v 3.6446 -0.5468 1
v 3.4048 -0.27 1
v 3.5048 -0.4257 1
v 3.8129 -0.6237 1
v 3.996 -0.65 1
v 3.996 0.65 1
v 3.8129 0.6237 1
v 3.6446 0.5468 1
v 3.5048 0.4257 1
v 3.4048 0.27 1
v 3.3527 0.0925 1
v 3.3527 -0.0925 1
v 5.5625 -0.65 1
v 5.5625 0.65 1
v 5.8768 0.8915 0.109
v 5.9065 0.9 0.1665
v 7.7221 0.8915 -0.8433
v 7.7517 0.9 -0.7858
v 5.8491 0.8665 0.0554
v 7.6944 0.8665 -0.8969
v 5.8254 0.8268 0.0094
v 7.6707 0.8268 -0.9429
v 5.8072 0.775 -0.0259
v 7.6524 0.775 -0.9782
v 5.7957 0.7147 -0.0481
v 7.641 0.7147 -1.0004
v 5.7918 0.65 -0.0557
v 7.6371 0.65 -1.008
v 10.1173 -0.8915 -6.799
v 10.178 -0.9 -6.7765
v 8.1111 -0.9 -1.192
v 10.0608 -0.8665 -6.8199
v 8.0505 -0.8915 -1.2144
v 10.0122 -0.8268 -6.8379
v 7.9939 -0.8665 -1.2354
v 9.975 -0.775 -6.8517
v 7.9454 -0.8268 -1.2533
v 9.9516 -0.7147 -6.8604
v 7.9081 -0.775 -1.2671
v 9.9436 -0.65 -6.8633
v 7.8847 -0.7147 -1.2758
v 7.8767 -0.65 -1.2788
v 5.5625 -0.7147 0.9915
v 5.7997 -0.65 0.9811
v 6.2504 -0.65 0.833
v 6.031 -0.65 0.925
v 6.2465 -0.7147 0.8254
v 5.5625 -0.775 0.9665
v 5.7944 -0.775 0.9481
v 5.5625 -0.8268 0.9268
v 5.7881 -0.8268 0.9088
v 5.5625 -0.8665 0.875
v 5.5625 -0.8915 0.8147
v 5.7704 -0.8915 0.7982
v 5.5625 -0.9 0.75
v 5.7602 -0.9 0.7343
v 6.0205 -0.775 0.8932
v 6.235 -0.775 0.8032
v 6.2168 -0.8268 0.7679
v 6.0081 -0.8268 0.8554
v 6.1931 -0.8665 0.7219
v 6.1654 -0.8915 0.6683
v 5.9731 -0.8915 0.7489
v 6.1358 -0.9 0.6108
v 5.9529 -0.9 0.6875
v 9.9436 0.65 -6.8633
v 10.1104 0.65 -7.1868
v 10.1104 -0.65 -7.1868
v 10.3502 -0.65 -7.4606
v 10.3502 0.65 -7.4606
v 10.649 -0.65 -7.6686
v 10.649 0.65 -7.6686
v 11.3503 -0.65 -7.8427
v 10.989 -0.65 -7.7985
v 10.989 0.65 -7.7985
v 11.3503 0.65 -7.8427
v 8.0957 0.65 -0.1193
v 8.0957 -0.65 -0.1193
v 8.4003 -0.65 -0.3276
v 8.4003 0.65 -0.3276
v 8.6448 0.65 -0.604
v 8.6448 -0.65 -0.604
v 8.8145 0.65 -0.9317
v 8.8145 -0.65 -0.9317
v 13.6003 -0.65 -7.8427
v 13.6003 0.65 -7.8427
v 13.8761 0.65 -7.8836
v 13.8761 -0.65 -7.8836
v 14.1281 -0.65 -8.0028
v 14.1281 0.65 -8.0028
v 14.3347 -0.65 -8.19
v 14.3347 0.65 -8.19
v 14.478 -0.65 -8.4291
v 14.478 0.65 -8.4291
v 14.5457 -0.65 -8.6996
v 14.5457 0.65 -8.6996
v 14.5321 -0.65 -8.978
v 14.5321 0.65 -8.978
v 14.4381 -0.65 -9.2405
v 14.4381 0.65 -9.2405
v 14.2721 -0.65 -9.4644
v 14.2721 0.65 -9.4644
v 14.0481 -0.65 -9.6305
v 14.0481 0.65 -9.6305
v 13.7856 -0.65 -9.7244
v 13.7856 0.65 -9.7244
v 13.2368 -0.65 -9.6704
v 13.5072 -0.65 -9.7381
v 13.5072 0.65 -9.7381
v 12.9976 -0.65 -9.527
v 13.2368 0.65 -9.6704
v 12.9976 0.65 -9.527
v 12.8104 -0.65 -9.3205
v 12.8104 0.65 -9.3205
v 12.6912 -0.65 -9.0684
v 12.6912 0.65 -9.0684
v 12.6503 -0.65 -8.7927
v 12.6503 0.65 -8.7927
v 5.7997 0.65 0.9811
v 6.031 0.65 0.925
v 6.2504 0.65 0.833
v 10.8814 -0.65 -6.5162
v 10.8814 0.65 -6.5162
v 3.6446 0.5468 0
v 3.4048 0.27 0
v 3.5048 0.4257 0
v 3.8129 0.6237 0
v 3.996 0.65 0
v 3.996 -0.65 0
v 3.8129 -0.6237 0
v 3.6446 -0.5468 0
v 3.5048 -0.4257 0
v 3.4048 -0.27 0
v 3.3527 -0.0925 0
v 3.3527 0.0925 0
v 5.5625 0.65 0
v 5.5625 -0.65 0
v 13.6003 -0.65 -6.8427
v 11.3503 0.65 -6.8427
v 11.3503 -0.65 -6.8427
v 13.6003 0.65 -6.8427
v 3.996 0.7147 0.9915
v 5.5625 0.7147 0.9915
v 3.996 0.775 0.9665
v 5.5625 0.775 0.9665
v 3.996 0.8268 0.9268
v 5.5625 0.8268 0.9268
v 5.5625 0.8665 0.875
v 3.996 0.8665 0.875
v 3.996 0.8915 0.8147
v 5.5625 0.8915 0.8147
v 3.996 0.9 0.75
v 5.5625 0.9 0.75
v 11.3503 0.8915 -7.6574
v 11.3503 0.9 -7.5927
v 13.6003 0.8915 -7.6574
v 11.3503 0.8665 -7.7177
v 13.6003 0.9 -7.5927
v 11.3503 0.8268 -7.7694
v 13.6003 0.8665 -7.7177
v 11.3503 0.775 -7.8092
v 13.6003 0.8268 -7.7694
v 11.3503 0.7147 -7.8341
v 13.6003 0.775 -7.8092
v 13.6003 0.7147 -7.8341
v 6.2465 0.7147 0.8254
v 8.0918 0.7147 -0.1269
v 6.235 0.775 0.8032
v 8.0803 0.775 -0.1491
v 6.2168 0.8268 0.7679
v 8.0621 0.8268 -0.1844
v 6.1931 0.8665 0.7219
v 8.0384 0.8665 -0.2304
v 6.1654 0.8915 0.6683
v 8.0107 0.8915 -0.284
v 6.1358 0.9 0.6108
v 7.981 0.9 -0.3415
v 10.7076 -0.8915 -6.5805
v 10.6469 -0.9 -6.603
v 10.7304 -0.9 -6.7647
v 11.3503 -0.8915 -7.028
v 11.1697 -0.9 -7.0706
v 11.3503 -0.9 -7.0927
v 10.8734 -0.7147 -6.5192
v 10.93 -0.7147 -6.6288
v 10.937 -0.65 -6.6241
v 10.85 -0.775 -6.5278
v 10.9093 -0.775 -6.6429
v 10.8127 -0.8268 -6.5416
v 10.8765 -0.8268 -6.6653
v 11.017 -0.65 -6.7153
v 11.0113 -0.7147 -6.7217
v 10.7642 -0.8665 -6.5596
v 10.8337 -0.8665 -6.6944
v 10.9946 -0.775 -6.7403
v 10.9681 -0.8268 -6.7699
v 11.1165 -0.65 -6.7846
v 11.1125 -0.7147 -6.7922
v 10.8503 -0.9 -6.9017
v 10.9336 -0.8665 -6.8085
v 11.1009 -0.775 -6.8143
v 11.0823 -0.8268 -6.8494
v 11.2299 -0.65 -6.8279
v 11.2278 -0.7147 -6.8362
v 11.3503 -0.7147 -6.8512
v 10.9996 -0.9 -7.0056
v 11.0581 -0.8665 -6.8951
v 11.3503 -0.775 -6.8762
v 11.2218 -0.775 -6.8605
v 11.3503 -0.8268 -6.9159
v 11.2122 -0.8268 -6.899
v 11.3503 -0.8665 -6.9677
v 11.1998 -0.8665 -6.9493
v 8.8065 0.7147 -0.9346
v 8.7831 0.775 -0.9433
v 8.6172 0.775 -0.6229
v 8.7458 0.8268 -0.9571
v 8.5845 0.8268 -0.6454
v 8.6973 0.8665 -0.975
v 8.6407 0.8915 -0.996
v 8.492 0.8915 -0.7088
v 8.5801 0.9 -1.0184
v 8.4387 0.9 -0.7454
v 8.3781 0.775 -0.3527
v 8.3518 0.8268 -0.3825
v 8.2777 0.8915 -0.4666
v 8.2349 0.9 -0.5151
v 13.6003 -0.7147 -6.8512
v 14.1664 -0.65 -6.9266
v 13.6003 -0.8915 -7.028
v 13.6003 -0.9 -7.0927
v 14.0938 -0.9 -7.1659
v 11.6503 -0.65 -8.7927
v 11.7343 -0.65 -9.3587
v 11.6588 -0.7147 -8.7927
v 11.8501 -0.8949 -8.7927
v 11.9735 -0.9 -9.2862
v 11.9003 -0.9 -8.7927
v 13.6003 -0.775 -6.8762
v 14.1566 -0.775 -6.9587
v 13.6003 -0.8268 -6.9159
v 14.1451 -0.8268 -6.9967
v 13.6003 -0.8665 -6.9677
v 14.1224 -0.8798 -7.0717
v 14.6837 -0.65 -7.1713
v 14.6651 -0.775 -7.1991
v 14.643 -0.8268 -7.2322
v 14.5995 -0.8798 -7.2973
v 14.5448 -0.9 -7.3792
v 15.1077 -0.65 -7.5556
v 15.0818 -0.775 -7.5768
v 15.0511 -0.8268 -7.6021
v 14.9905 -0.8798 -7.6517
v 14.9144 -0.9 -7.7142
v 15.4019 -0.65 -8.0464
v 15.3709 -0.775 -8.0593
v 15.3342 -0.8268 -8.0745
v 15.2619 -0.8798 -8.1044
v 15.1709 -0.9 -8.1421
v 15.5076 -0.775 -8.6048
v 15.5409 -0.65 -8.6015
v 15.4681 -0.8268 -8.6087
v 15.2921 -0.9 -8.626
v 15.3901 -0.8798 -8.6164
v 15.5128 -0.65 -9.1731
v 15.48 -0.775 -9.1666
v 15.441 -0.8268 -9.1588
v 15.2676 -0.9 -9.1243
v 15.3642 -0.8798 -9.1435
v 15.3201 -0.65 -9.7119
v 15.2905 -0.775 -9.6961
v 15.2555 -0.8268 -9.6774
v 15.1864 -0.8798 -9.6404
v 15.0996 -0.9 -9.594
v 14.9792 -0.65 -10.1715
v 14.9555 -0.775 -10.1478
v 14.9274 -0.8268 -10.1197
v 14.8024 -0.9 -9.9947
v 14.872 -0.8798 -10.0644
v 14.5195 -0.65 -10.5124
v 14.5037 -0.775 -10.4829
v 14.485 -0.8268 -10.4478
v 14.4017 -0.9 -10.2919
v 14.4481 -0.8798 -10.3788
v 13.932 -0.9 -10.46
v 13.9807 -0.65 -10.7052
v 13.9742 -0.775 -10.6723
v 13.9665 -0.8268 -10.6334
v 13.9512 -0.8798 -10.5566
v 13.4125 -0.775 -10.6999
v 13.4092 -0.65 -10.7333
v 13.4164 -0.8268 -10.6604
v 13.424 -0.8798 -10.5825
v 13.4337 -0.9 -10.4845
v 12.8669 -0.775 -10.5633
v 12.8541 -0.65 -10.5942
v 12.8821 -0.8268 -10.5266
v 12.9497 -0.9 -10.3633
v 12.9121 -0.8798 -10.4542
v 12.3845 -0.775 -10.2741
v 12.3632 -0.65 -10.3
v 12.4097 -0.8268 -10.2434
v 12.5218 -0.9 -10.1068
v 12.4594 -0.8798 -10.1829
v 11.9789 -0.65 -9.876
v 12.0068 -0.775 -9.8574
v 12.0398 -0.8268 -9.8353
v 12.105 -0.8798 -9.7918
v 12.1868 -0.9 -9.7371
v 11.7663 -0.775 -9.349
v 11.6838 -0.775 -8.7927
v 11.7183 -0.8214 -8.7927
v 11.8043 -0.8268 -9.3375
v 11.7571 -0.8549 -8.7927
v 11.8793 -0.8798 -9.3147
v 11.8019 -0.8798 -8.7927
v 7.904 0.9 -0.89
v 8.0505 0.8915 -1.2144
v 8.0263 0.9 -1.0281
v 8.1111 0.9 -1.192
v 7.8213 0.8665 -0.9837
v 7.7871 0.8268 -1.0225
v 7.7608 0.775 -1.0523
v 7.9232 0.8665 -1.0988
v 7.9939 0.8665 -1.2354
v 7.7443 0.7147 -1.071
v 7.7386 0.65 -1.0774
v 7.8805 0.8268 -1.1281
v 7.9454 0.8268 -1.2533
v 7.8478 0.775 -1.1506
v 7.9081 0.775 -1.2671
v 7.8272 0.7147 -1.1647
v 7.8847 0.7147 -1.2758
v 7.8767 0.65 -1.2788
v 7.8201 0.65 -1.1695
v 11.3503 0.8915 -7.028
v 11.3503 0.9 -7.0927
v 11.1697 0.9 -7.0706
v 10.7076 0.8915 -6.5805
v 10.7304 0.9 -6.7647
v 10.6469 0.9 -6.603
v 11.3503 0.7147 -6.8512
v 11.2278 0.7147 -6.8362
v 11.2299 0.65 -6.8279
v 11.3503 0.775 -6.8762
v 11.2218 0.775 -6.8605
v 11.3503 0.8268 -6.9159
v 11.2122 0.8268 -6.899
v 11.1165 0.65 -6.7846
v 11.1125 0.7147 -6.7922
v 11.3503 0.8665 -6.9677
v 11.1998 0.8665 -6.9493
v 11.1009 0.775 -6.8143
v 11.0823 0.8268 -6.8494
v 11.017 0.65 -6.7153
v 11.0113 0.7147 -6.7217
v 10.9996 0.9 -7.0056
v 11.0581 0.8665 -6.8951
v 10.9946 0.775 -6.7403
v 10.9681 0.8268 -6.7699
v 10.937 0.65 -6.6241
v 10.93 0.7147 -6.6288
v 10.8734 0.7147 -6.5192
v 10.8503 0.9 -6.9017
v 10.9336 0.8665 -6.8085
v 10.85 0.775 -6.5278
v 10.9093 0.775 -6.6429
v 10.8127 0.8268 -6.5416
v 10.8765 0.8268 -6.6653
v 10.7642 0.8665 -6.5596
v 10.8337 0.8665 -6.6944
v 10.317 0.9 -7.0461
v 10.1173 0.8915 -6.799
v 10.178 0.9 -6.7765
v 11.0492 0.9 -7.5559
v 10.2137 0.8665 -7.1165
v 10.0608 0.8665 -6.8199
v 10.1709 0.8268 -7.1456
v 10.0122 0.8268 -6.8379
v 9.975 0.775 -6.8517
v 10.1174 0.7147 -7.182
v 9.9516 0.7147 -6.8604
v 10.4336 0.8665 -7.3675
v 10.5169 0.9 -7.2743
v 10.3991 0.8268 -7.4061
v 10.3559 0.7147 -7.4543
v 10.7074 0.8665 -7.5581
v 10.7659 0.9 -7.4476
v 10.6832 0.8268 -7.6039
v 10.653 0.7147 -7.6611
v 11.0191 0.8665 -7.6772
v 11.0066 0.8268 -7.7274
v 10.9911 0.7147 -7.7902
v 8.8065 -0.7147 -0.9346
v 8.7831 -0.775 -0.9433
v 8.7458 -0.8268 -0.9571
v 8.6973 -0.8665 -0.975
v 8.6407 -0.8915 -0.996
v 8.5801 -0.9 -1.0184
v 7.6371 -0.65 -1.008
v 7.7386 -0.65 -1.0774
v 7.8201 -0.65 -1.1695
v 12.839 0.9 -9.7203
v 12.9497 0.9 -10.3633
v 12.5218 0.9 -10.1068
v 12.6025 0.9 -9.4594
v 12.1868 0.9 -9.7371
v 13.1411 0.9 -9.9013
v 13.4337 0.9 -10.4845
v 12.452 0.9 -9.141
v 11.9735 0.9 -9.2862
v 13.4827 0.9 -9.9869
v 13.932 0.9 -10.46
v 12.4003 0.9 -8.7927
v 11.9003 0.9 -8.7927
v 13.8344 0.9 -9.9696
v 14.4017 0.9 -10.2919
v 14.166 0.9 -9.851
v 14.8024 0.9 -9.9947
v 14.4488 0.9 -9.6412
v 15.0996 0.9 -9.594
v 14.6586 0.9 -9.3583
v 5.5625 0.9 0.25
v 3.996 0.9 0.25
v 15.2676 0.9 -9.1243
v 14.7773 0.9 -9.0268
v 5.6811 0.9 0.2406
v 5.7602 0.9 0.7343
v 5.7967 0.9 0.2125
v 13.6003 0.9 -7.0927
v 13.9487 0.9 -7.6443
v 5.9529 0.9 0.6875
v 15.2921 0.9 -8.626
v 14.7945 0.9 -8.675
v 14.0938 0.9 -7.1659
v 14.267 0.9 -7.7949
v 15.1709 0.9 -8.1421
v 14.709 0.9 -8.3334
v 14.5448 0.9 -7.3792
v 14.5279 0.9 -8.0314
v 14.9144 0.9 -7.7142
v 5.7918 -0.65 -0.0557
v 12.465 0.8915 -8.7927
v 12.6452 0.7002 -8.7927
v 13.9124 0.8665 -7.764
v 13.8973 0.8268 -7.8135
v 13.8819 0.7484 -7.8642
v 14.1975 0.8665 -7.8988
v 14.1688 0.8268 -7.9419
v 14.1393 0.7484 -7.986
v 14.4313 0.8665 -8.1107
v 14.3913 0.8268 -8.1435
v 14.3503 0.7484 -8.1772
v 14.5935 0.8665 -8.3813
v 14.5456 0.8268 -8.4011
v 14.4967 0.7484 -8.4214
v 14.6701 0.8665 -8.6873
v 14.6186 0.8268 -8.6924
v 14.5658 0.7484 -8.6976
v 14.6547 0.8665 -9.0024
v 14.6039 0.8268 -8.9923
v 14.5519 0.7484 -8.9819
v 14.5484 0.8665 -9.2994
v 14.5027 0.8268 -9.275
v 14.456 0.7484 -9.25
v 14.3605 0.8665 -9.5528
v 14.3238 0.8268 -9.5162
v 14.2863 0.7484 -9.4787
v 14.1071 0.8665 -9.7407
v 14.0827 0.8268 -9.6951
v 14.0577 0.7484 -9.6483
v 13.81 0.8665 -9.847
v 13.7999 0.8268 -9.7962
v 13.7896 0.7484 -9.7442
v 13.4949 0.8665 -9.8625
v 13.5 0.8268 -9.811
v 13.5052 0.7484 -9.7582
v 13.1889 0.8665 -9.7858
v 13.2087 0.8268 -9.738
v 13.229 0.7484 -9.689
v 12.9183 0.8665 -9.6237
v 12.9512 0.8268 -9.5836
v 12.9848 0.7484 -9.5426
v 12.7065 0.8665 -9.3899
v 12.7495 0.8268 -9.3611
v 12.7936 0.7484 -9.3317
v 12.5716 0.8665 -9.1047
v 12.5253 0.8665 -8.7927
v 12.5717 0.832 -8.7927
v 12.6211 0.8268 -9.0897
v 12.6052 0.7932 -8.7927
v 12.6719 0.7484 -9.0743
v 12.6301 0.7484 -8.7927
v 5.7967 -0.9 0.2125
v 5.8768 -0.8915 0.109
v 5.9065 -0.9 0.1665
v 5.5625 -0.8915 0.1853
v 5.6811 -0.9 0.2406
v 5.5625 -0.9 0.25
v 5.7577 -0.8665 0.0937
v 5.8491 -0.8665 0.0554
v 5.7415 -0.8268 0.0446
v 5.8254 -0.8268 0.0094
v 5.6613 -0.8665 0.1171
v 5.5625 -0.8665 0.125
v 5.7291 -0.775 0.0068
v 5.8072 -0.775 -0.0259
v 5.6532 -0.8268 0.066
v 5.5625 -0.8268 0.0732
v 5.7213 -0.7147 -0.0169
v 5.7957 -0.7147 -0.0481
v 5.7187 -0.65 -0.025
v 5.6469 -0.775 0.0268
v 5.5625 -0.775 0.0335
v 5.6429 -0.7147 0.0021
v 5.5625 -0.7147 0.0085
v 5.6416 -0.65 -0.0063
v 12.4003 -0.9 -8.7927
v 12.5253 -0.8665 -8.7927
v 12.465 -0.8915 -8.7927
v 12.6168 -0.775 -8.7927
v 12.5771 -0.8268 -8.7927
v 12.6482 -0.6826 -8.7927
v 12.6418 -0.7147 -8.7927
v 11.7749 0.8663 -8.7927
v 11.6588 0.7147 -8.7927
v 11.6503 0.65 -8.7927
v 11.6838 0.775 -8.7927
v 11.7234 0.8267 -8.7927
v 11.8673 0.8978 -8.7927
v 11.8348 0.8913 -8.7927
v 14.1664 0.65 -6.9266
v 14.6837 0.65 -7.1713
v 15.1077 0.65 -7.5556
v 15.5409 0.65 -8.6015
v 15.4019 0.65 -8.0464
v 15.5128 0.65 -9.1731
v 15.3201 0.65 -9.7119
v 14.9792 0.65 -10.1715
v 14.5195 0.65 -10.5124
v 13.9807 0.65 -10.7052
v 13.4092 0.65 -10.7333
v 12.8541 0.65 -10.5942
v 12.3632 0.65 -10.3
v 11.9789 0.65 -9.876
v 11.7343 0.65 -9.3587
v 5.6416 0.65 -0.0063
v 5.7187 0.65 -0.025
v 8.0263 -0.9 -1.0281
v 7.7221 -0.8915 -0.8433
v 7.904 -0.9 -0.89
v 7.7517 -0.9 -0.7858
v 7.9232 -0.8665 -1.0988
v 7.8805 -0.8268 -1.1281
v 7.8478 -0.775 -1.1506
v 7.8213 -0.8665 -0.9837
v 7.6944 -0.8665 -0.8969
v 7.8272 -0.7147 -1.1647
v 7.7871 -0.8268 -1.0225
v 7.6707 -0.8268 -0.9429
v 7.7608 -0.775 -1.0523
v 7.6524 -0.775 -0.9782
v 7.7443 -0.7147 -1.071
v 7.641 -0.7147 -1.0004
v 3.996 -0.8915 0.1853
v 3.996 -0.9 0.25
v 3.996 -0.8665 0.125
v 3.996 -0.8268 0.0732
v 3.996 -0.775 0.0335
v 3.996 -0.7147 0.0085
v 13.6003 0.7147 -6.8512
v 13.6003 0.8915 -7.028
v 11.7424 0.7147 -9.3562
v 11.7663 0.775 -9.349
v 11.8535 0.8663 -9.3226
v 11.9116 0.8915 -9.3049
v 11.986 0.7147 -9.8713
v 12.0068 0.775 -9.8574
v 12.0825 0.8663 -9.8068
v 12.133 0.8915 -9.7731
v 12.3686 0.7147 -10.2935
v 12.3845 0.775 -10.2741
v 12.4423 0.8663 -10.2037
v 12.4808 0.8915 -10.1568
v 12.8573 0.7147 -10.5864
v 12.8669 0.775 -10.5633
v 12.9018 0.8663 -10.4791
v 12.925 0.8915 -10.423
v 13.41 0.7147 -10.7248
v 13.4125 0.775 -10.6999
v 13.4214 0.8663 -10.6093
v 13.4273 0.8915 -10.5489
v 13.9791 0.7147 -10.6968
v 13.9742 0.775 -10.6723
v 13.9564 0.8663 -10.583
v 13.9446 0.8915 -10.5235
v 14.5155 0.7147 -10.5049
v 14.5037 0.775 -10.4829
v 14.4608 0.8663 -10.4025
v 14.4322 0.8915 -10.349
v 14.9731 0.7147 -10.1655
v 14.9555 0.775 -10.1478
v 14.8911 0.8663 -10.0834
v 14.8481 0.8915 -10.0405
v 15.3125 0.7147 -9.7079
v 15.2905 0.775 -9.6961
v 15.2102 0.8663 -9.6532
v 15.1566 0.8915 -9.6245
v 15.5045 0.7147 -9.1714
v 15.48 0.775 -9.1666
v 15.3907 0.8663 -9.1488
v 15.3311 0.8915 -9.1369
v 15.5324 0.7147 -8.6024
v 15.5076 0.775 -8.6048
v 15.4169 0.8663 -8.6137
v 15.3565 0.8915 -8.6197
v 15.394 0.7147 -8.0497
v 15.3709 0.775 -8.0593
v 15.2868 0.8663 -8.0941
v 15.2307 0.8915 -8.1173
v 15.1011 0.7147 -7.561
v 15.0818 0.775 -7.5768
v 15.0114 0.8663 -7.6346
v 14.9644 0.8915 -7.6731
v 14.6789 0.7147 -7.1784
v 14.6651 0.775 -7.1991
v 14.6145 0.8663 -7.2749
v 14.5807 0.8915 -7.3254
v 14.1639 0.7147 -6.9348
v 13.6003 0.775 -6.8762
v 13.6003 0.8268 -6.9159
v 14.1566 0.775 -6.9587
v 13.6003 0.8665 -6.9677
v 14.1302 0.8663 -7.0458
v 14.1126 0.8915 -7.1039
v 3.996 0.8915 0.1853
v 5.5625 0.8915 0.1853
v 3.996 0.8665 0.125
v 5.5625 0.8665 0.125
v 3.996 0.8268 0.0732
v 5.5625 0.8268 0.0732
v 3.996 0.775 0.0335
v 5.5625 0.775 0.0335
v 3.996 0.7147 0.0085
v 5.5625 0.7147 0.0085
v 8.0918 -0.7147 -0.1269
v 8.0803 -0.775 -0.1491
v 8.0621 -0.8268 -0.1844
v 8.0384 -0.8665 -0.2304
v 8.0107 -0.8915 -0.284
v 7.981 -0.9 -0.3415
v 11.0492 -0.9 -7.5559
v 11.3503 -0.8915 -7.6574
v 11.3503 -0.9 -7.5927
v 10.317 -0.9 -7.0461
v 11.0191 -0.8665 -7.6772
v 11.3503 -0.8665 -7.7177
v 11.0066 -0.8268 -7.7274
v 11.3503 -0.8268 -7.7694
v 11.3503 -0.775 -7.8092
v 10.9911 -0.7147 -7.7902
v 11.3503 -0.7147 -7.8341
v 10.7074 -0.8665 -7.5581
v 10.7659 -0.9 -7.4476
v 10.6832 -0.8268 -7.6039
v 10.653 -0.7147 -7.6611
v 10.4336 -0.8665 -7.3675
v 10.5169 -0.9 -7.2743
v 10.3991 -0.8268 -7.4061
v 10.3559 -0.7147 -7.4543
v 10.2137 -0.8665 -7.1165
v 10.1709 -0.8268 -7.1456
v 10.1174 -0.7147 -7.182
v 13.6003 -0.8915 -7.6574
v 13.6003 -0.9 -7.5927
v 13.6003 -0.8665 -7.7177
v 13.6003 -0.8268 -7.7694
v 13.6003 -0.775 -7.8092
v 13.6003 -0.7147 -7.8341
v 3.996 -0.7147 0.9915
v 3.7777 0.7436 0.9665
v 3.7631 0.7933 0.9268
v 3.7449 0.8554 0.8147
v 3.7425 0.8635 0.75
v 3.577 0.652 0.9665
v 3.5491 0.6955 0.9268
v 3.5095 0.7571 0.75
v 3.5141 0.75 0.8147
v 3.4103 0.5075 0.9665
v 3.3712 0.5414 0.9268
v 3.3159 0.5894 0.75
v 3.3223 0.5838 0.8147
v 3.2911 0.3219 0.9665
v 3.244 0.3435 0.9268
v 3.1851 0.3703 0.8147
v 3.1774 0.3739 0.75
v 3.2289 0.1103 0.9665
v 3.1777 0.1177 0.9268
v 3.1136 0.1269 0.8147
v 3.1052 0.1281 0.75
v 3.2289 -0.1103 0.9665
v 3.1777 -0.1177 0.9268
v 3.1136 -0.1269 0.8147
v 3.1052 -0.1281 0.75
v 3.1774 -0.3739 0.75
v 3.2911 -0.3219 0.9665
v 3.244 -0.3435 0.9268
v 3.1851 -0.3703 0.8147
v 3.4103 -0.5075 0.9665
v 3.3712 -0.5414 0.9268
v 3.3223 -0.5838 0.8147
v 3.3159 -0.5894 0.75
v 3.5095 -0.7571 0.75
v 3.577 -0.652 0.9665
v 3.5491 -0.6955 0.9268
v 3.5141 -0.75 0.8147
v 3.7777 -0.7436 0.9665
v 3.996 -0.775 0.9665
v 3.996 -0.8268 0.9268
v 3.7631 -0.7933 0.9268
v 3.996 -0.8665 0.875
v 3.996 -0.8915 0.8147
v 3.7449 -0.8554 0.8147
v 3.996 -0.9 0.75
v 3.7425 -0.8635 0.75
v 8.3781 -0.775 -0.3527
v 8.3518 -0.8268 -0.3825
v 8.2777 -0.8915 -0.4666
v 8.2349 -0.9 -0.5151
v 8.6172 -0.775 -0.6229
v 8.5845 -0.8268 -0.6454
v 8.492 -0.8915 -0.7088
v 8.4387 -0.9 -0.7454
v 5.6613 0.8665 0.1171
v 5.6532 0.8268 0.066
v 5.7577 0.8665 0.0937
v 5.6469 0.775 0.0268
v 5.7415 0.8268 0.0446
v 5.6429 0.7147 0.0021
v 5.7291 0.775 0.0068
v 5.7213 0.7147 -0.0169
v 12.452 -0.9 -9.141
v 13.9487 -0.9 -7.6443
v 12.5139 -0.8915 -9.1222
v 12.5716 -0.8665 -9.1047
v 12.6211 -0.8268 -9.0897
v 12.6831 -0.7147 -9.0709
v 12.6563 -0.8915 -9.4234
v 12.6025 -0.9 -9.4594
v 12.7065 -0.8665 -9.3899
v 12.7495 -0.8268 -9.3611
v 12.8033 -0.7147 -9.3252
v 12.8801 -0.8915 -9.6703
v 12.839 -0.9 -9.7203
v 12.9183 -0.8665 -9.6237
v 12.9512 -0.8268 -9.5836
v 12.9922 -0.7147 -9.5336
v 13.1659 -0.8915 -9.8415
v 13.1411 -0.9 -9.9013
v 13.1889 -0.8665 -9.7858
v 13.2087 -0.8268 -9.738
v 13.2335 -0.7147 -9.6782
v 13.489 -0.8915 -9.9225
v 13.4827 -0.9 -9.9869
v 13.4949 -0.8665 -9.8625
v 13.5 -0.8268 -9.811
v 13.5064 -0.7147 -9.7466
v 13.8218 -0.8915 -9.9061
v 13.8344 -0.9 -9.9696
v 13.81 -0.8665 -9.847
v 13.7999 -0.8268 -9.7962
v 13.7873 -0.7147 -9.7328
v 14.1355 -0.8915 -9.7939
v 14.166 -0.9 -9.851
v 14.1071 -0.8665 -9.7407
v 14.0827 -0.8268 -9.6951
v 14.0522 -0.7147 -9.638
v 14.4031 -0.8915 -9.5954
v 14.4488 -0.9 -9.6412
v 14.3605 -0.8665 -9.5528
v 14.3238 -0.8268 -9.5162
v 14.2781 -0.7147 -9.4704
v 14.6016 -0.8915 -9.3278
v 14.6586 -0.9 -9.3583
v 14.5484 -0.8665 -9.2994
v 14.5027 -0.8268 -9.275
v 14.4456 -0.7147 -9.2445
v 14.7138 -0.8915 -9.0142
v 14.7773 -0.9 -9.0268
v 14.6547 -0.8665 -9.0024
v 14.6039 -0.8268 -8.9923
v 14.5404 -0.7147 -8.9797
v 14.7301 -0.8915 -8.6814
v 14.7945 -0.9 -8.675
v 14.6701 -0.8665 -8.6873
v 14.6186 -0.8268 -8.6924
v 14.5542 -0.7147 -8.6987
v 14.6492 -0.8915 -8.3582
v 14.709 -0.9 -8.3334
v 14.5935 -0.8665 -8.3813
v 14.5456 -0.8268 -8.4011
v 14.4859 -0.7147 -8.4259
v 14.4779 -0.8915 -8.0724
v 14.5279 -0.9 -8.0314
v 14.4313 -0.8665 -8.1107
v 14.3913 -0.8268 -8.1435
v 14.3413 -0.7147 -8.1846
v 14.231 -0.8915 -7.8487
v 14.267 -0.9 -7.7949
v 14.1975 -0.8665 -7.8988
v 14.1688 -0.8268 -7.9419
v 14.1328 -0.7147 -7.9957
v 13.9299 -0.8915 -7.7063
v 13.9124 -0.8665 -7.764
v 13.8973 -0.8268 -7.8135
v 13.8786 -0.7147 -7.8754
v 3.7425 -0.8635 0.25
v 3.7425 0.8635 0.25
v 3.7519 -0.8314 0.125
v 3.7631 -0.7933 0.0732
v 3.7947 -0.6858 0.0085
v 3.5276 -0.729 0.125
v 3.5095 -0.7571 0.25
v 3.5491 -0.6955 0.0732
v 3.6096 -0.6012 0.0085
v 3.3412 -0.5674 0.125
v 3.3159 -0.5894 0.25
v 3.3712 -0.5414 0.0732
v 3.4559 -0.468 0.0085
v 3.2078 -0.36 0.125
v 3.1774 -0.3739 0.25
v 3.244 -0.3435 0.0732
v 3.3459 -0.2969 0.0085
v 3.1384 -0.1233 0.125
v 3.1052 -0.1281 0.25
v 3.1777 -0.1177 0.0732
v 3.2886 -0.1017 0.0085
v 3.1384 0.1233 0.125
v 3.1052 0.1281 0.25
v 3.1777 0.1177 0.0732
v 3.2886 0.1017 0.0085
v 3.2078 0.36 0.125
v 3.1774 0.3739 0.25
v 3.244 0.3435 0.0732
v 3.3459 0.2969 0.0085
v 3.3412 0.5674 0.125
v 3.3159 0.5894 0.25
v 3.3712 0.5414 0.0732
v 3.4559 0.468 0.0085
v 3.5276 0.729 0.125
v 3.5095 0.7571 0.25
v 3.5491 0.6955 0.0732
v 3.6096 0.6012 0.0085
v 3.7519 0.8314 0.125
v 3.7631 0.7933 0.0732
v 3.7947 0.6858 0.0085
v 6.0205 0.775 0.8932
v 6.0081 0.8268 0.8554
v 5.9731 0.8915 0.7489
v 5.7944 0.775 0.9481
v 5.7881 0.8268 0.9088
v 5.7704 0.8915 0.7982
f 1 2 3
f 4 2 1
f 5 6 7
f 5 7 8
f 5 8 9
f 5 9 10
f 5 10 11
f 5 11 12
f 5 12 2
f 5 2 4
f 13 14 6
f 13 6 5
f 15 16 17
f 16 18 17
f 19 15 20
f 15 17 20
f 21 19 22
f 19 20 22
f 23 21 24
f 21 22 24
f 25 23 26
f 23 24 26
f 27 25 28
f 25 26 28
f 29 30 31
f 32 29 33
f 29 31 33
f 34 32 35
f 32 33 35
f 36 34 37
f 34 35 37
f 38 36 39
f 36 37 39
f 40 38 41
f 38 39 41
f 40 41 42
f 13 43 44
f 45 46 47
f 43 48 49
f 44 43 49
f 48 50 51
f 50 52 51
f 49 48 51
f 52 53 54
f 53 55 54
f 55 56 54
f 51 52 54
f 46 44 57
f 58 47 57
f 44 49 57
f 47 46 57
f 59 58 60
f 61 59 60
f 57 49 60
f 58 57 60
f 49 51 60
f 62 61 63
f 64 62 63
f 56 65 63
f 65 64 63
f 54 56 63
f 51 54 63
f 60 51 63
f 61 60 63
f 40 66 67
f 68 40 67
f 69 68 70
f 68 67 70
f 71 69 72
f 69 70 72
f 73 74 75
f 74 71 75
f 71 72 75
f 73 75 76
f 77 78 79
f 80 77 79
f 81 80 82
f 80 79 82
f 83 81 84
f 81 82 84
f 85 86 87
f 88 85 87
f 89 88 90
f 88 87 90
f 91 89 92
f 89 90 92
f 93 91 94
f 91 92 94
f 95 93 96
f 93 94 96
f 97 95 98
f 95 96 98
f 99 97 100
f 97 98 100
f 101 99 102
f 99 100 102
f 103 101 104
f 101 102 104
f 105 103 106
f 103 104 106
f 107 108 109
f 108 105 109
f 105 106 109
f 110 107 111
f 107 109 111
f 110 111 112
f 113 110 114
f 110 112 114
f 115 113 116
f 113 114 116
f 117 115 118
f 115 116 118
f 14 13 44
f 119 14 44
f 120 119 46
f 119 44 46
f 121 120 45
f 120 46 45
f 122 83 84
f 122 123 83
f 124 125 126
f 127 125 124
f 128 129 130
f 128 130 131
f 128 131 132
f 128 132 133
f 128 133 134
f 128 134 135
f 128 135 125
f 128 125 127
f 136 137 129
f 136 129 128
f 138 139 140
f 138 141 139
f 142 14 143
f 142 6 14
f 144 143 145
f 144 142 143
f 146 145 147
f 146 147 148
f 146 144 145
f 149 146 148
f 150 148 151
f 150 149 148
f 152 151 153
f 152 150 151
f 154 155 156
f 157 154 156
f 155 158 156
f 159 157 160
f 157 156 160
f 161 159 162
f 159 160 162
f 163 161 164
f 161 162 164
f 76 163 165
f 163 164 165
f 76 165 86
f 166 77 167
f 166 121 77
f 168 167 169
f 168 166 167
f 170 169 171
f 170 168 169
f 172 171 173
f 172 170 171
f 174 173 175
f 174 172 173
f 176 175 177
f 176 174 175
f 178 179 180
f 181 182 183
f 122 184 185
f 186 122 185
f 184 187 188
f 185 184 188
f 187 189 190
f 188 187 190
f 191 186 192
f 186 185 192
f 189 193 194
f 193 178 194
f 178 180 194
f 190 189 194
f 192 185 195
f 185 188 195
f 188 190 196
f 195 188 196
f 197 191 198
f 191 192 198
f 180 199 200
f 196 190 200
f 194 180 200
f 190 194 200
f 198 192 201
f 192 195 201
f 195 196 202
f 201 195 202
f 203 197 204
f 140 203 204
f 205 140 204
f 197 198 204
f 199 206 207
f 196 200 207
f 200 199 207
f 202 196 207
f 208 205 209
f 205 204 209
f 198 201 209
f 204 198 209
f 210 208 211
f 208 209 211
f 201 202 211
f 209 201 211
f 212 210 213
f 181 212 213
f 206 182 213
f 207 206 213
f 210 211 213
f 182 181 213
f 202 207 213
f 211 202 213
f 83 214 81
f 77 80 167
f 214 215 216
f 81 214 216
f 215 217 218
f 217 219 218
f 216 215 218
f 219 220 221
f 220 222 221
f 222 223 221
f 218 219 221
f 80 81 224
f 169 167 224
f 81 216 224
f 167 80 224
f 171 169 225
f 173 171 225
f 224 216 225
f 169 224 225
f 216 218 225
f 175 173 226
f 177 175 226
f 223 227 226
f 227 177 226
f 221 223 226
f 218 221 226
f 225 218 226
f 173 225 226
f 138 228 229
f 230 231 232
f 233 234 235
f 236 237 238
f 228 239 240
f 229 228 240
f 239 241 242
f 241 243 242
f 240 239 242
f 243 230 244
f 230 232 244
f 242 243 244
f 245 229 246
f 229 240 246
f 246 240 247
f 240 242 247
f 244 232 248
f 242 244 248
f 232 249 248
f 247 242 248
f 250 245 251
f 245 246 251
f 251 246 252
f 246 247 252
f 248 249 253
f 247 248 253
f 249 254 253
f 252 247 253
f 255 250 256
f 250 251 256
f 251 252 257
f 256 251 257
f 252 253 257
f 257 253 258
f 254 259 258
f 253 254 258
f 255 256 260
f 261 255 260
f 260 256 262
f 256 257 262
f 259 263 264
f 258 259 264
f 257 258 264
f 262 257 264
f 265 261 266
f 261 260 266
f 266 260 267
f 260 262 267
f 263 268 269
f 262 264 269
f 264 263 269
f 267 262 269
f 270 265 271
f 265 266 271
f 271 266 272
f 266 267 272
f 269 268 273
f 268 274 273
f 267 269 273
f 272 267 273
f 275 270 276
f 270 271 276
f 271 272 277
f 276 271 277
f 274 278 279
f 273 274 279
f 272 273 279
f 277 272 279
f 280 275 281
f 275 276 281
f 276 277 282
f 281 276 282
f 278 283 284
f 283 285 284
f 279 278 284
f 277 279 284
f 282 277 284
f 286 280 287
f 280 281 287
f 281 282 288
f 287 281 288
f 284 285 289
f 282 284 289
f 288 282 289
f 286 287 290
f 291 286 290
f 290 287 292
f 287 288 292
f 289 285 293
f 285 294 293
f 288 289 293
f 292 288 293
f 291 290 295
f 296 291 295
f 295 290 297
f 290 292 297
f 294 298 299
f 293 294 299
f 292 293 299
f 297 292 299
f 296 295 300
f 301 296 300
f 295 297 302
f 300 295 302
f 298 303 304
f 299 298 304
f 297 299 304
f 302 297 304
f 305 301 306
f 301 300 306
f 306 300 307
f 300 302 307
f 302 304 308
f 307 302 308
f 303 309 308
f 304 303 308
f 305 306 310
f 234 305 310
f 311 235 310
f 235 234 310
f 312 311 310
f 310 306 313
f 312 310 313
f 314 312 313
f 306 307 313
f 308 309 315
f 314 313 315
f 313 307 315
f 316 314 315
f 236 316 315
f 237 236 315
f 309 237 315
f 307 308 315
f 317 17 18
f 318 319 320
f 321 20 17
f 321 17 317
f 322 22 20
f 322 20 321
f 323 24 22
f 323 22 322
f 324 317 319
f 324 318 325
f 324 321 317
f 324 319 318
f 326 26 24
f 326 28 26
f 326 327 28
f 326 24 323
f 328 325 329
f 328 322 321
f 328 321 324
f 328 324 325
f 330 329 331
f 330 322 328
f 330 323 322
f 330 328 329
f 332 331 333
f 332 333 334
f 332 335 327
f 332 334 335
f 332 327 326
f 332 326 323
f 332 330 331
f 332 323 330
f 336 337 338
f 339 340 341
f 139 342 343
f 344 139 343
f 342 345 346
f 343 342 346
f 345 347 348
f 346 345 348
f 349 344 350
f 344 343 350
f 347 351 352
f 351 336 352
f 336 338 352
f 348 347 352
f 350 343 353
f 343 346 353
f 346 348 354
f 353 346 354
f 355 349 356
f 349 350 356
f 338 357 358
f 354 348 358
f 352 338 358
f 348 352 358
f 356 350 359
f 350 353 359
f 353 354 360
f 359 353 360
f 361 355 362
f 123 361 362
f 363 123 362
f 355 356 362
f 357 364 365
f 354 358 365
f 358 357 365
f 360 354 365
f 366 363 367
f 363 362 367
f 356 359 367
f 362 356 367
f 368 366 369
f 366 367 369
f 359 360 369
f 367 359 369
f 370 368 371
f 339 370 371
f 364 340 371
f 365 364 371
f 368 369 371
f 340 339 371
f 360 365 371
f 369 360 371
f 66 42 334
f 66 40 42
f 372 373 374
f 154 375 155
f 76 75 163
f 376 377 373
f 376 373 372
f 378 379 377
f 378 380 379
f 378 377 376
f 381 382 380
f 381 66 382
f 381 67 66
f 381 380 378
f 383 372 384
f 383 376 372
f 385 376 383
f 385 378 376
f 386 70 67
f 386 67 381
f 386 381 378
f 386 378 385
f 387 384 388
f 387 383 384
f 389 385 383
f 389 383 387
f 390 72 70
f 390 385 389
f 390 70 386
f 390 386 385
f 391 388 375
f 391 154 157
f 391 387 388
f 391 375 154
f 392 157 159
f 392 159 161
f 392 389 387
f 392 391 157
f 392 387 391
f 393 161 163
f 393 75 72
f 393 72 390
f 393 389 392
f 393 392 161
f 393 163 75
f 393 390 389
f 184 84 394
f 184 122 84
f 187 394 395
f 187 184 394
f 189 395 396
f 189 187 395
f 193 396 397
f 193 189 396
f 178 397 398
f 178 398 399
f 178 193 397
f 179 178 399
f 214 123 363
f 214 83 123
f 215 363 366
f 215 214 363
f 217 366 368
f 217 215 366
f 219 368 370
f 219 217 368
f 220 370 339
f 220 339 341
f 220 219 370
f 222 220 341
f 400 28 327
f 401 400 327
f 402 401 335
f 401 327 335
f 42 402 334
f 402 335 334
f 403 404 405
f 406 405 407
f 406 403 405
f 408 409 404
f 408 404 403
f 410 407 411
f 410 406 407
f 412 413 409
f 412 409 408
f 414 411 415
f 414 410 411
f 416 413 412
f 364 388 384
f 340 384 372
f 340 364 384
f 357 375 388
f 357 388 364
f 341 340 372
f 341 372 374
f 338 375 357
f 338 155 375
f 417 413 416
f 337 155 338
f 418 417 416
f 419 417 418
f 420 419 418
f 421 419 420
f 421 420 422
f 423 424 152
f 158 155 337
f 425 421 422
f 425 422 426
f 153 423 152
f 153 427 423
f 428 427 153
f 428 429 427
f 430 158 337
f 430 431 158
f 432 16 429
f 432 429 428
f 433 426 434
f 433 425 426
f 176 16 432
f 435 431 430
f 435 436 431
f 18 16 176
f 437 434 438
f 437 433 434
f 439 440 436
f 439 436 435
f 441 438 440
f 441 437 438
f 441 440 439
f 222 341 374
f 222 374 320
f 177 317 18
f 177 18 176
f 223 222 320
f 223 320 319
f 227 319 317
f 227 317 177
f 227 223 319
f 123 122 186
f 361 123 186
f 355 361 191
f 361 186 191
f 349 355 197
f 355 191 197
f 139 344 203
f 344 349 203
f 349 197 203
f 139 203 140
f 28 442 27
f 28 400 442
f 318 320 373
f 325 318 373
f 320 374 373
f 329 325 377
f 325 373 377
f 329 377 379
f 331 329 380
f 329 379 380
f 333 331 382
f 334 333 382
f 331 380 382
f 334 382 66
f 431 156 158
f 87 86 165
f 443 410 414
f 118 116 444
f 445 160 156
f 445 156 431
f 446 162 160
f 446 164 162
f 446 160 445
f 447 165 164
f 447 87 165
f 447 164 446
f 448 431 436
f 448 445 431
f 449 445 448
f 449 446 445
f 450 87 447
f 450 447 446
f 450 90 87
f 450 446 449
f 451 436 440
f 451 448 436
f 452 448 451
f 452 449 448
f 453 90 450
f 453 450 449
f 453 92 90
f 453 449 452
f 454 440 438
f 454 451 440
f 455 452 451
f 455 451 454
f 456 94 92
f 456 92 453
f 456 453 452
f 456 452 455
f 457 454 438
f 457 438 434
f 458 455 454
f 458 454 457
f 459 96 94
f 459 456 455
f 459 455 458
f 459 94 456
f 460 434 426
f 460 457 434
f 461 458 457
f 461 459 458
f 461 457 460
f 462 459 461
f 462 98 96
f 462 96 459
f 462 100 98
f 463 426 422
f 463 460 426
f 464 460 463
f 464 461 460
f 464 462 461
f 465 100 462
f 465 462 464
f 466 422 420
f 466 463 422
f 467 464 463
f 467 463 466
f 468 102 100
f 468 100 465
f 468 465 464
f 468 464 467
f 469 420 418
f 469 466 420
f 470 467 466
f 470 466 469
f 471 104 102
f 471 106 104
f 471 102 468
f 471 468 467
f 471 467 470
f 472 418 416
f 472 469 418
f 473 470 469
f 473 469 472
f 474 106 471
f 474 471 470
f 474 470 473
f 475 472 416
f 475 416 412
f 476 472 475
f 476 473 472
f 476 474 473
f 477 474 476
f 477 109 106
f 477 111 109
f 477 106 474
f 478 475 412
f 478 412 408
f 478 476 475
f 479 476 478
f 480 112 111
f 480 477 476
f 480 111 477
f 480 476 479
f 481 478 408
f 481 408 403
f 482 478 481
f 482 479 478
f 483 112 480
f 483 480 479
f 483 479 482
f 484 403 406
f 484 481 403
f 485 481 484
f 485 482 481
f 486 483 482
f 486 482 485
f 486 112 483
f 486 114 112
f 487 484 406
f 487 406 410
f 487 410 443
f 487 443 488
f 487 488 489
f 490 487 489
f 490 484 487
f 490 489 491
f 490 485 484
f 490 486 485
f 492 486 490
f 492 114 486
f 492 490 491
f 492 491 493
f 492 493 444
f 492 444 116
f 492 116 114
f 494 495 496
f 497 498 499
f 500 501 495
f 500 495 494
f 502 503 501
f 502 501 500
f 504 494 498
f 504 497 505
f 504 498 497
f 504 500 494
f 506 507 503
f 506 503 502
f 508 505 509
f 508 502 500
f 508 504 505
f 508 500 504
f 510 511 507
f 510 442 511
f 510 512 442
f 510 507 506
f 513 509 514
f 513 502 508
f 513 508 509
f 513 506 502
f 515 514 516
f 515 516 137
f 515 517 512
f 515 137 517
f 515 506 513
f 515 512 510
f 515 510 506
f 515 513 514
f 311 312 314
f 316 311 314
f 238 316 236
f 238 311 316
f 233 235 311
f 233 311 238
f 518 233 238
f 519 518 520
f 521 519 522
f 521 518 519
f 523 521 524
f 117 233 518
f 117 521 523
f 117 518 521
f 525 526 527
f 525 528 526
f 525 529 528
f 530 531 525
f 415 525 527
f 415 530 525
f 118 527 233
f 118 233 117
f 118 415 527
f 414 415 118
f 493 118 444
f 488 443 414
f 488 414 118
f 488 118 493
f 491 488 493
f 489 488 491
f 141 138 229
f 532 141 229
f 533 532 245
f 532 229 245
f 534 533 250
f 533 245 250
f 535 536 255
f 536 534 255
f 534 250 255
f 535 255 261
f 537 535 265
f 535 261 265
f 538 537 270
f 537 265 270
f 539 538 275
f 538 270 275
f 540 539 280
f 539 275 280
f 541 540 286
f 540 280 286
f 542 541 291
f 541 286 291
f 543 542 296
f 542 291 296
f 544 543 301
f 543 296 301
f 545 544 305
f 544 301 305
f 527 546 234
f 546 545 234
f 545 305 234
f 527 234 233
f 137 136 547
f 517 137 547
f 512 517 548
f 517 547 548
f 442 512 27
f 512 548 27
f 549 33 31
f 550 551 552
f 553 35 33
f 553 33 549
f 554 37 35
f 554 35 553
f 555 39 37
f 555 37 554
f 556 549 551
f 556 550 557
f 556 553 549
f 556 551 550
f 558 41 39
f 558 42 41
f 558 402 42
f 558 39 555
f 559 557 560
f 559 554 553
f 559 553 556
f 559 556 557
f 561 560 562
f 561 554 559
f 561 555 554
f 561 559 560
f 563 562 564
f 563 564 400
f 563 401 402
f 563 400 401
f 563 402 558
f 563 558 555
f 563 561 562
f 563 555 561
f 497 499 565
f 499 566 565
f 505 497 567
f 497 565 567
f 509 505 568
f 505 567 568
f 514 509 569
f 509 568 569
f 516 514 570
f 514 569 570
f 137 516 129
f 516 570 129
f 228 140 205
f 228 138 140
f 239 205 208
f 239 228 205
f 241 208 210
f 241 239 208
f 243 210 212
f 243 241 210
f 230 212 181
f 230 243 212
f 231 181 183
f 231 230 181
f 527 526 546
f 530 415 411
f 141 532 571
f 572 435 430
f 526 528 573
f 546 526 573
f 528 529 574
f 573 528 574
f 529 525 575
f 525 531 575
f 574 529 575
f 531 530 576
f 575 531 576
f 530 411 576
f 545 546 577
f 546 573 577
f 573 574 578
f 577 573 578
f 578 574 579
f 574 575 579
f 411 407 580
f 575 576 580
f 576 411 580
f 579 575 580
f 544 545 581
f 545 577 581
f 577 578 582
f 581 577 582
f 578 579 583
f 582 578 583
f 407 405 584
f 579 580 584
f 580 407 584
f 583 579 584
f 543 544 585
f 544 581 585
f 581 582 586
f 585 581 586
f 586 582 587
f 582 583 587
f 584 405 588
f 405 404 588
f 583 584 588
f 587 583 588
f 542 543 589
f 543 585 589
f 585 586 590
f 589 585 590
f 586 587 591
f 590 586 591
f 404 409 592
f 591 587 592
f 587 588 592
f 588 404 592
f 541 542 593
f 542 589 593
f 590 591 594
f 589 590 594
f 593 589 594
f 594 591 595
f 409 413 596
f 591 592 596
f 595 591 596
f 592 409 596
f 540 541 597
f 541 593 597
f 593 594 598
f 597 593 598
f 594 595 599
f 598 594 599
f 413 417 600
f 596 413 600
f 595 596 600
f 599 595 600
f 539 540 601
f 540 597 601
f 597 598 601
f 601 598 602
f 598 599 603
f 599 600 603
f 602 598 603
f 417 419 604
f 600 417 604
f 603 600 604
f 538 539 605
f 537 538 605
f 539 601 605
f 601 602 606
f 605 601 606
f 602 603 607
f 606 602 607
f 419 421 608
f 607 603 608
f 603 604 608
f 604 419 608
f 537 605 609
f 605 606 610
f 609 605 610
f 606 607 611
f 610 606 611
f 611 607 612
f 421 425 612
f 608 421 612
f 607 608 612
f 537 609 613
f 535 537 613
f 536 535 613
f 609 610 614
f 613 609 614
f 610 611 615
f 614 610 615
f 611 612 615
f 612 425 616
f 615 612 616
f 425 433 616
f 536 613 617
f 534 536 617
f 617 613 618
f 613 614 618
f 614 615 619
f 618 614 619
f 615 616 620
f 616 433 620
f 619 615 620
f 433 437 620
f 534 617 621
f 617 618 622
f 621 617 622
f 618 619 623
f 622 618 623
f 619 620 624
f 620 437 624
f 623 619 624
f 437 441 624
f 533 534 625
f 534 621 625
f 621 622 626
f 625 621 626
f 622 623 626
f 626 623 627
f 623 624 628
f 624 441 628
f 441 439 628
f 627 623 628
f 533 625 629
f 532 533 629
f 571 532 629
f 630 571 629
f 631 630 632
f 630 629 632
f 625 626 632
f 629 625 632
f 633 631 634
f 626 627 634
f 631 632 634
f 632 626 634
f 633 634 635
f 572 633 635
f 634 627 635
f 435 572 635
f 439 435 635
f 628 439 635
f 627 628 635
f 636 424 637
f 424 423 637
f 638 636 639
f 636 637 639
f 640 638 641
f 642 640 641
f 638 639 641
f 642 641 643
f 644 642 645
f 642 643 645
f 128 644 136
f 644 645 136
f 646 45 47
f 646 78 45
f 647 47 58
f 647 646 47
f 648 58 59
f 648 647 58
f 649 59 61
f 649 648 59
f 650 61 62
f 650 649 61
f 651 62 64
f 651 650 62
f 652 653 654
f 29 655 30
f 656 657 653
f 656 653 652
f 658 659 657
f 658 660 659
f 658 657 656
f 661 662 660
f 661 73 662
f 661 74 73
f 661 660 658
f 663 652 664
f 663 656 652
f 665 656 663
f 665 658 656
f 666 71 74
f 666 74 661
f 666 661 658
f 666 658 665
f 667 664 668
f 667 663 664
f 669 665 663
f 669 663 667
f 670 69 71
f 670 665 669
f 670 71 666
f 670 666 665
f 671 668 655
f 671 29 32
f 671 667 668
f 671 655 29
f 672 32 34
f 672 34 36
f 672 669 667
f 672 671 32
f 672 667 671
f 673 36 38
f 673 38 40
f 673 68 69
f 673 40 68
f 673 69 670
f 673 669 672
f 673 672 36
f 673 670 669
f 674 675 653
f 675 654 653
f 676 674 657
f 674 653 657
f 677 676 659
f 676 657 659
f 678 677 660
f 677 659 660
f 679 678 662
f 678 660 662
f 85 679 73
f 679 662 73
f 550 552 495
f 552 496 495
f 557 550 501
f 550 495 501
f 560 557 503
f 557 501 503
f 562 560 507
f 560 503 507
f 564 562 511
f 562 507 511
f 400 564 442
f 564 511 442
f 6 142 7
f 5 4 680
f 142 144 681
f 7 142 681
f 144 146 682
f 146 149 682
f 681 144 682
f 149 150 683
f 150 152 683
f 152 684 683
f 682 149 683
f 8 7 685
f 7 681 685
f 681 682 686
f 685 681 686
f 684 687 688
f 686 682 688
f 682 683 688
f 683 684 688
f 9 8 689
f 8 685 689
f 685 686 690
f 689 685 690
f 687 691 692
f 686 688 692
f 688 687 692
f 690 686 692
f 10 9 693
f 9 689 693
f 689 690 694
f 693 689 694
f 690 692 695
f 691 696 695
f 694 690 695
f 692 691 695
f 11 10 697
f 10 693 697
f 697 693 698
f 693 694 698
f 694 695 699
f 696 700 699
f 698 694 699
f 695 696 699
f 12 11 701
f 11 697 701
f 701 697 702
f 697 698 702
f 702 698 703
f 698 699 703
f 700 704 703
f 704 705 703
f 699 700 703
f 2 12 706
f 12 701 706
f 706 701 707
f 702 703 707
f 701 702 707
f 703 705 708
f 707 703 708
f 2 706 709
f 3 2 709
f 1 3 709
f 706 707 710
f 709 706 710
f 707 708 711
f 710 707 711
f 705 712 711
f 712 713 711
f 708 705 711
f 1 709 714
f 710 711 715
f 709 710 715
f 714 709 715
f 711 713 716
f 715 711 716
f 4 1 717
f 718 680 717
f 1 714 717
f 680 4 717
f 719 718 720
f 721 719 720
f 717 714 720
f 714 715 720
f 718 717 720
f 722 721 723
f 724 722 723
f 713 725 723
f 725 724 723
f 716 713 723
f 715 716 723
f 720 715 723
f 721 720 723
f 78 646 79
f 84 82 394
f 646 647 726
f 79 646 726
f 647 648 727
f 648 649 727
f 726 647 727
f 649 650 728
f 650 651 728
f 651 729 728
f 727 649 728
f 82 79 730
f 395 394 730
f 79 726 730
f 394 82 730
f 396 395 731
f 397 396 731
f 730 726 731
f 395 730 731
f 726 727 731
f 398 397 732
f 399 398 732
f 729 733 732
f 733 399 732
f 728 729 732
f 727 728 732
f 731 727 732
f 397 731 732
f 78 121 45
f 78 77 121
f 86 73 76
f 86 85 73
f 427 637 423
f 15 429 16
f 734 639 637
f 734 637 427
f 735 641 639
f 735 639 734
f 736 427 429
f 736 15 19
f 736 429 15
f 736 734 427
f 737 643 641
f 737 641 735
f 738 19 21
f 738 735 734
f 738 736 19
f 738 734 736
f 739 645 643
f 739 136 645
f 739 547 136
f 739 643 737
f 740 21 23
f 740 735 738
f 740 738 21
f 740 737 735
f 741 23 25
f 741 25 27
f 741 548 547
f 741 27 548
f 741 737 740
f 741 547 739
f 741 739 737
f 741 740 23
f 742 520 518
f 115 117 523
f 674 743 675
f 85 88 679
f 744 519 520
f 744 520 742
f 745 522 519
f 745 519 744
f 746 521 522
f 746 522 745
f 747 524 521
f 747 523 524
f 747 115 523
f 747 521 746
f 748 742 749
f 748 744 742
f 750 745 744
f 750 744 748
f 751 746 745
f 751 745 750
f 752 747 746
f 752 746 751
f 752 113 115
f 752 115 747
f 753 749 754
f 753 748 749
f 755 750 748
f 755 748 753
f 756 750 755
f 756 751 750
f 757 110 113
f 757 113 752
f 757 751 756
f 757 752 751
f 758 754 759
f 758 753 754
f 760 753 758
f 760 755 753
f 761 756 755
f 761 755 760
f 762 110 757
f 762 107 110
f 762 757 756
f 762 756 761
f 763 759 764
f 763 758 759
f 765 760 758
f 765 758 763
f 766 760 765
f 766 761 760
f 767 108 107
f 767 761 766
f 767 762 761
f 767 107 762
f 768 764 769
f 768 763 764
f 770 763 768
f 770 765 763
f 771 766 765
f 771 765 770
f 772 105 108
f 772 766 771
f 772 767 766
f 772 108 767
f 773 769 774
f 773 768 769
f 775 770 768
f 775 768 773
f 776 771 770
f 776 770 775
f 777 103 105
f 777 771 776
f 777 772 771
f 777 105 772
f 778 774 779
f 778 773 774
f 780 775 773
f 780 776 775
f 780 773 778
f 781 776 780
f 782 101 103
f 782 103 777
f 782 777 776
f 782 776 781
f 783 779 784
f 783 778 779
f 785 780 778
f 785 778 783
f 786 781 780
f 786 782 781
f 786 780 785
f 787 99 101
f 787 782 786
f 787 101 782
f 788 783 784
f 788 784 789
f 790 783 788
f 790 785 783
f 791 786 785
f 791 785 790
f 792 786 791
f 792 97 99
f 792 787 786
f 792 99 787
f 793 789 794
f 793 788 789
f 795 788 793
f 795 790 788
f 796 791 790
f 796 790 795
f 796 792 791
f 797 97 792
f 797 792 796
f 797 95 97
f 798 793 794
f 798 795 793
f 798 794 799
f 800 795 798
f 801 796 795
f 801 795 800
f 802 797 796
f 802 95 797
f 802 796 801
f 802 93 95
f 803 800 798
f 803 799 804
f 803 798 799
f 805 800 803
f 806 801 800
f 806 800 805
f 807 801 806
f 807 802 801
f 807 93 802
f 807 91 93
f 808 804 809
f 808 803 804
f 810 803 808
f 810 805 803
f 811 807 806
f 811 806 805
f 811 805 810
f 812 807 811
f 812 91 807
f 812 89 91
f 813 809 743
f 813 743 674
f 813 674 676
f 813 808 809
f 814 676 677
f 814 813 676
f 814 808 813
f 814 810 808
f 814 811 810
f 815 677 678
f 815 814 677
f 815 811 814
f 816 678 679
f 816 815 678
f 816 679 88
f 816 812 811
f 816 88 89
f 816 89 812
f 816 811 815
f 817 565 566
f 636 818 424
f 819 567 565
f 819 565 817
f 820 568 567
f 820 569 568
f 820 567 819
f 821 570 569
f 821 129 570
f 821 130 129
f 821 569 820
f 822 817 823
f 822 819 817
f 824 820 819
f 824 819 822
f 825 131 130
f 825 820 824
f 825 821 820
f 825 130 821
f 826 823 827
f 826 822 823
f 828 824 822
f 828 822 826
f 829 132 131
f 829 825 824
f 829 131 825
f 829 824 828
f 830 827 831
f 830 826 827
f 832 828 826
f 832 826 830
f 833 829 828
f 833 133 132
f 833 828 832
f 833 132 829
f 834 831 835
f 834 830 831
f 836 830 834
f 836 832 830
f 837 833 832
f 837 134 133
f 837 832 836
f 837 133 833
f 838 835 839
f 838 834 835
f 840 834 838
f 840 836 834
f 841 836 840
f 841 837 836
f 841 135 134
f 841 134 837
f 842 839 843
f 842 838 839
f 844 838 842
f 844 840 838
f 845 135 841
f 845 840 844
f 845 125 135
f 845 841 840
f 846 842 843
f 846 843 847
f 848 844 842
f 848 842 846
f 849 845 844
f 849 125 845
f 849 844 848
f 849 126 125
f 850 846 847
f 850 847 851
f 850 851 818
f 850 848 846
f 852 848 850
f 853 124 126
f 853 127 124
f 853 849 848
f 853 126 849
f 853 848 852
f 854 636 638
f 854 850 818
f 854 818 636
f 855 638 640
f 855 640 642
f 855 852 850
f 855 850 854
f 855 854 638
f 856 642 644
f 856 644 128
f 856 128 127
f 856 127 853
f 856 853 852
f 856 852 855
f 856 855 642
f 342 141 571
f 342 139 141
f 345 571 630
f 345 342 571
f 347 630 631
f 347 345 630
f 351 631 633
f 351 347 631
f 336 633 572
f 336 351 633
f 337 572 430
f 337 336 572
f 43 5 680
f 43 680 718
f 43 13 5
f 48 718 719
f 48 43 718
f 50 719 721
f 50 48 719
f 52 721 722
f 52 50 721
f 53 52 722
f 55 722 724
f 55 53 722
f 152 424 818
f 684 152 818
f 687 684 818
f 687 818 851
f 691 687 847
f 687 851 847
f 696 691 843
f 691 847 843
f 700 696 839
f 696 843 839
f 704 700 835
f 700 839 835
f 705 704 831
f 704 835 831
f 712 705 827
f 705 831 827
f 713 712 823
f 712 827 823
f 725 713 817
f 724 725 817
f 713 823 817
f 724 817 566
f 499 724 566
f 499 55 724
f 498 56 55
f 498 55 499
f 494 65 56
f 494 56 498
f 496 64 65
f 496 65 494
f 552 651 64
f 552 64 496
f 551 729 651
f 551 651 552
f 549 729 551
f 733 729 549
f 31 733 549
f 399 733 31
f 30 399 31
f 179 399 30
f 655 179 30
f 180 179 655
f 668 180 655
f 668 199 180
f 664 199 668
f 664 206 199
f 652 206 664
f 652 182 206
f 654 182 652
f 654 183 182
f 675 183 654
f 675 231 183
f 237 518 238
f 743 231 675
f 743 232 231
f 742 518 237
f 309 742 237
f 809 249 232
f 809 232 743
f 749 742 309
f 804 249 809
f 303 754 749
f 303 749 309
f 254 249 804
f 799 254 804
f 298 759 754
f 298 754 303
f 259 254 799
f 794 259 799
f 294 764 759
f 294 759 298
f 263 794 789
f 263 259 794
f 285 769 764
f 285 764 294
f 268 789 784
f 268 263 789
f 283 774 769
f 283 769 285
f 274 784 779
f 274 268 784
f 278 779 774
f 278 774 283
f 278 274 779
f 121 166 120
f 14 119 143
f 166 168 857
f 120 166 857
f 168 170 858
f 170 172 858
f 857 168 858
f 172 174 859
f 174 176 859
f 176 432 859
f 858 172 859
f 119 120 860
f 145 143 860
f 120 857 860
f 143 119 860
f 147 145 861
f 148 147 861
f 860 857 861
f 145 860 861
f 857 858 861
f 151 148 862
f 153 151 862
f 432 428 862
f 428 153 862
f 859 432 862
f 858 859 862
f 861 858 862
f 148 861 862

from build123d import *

# Parameters (mm, degrees)
BASE_EXTRUDE_DEPTH = 1
SKETCH3_W          = 1
SKETCH3_H          = 1.8
FILLET2_R          = 0.25
FILLET3_R          = 0.25


with BuildPart() as part:
    # Sketch1 → Base-Extrude (new body)
    with BuildSketch(Plane.XY):
        with BuildLine():
            Line((5.305323422, 0.9), (3.996041137, 0.9))
            ThreePointArc((3.996041137, 0.9), (3.096041137, 0), (3.996041137, -0.9))
            Line((3.996041137, -0.9), (5.305323422, -0.9))
            Line((5.305323422, -0.9), (5.305323422, 0.9))
        make_face()
    extrude(amount=BASE_EXTRUDE_DEPTH)

    # Boss-Sweep1: sweep along a path in Sketch2
    with BuildLine(Plane(origin=(0, 0, 0), x_dir=(1, 0, 0), z_dir=(0, 1, 0))) as boss_sweep1_path:
        Line((5.305323422, -0.5), (5.562500347, -0.5))
        ThreePointArc((5.562500347, -0.5), (5.798466413, -0.471761296), (6.021105728, -0.388640031))
        Line((6.021105728, -0.388640031), (7.866380982, 0.563661386))
        ThreePointArc((7.866380982, 0.563661386), (8.156658179, 0.789598704), (8.34560518, 1.105205347))
        Line((8.34560518, 1.105205347), (10.412481631, 6.689762596))
        ThreePointArc((10.412481631, 6.689762596), (10.778951458, 7.163366249), (11.350311209, 7.342666526))
        Line((11.350311209, 7.342666526), (13.600311209, 7.342666526))
        ThreePointArc((13.600311209, 7.342666526), (14.625616042, 9.817971359), (12.150311209, 8.792666526))
    # Sketch3 → Boss-Sweep1 (sweep)
    with BuildSketch(Plane(origin=(5.305323422, 0, 0), x_dir=(0, 0, -1), z_dir=(1, 0, 0))):
        with Locations((-0.5, 0)):
            Rectangle(SKETCH3_W, SKETCH3_H)
    sweep(path=boss_sweep1_path.line)

    # Fillet2
    fillet2_edges = [part.edges().sort_by_distance(p)[0] for p in [
        (4.779270742, 0.9, 1),
        (14.979169433, -0.9, -10.17152475),
        (12.475311209, -0.9, -6.842666526),
        (11.064631334, -0.9, -6.753016388),
        (9.847958195, -0.9, -3.723935937),
        (8.531099467, -0.9, -0.458247348),
        (7.173046045, -0.9, 0.356809338),
        (5.916449446, -0.9, 0.957641943),
        (5.916449446, 0.9, 0.957641943),
        (7.173046045, 0.9, 0.356809338),
        (8.531099467, 0.9, -0.458247348),
        (9.847958195, 0.9, -3.723935937),
        (11.064631334, 0.9, -6.753016388),
        (12.475311209, 0.9, -6.842666526),
        (14.979169433, 0.9, -10.17152475),
        (3.096041137, 0, 1),
        (4.779270742, -0.9, 1),
    ]]
    fillet(fillet2_edges, radius=FILLET2_R)

    # Fillet3
    fillet3_edges = [part.edges().sort_by_distance(p)[0] for p in [
        (14.272062652, 0.9, -9.464417969),
        (12.475311209, 0.9, -7.842666526),
        (10.493271583, 0.9, -7.57371611),
        (8.910128616, 0.9, -4.071032006),
        (7.78221689, 0.9, -1.120950061),
        (6.714440665, 0.9, -0.531830693),
        (5.68048338, 0.9, -0.014119352),
        (5.68048338, -0.9, -0.014119352),
        (6.714440665, -0.9, -0.531830693),
        (7.78221689, -0.9, -1.120950061),
        (8.910128616, -0.9, -4.071032006),
        (10.493271583, -0.9, -7.57371611),
        (12.475311209, -0.9, -7.842666526),
        (14.272062652, -0.9, -9.464417969),
        (4.779270742, 0.9, 0),
        (4.779270742, -0.9, 0),
        (3.096041137, 0, 0),
    ]]
    fillet(fillet3_edges, radius=FILLET3_R)


solid = part.part
